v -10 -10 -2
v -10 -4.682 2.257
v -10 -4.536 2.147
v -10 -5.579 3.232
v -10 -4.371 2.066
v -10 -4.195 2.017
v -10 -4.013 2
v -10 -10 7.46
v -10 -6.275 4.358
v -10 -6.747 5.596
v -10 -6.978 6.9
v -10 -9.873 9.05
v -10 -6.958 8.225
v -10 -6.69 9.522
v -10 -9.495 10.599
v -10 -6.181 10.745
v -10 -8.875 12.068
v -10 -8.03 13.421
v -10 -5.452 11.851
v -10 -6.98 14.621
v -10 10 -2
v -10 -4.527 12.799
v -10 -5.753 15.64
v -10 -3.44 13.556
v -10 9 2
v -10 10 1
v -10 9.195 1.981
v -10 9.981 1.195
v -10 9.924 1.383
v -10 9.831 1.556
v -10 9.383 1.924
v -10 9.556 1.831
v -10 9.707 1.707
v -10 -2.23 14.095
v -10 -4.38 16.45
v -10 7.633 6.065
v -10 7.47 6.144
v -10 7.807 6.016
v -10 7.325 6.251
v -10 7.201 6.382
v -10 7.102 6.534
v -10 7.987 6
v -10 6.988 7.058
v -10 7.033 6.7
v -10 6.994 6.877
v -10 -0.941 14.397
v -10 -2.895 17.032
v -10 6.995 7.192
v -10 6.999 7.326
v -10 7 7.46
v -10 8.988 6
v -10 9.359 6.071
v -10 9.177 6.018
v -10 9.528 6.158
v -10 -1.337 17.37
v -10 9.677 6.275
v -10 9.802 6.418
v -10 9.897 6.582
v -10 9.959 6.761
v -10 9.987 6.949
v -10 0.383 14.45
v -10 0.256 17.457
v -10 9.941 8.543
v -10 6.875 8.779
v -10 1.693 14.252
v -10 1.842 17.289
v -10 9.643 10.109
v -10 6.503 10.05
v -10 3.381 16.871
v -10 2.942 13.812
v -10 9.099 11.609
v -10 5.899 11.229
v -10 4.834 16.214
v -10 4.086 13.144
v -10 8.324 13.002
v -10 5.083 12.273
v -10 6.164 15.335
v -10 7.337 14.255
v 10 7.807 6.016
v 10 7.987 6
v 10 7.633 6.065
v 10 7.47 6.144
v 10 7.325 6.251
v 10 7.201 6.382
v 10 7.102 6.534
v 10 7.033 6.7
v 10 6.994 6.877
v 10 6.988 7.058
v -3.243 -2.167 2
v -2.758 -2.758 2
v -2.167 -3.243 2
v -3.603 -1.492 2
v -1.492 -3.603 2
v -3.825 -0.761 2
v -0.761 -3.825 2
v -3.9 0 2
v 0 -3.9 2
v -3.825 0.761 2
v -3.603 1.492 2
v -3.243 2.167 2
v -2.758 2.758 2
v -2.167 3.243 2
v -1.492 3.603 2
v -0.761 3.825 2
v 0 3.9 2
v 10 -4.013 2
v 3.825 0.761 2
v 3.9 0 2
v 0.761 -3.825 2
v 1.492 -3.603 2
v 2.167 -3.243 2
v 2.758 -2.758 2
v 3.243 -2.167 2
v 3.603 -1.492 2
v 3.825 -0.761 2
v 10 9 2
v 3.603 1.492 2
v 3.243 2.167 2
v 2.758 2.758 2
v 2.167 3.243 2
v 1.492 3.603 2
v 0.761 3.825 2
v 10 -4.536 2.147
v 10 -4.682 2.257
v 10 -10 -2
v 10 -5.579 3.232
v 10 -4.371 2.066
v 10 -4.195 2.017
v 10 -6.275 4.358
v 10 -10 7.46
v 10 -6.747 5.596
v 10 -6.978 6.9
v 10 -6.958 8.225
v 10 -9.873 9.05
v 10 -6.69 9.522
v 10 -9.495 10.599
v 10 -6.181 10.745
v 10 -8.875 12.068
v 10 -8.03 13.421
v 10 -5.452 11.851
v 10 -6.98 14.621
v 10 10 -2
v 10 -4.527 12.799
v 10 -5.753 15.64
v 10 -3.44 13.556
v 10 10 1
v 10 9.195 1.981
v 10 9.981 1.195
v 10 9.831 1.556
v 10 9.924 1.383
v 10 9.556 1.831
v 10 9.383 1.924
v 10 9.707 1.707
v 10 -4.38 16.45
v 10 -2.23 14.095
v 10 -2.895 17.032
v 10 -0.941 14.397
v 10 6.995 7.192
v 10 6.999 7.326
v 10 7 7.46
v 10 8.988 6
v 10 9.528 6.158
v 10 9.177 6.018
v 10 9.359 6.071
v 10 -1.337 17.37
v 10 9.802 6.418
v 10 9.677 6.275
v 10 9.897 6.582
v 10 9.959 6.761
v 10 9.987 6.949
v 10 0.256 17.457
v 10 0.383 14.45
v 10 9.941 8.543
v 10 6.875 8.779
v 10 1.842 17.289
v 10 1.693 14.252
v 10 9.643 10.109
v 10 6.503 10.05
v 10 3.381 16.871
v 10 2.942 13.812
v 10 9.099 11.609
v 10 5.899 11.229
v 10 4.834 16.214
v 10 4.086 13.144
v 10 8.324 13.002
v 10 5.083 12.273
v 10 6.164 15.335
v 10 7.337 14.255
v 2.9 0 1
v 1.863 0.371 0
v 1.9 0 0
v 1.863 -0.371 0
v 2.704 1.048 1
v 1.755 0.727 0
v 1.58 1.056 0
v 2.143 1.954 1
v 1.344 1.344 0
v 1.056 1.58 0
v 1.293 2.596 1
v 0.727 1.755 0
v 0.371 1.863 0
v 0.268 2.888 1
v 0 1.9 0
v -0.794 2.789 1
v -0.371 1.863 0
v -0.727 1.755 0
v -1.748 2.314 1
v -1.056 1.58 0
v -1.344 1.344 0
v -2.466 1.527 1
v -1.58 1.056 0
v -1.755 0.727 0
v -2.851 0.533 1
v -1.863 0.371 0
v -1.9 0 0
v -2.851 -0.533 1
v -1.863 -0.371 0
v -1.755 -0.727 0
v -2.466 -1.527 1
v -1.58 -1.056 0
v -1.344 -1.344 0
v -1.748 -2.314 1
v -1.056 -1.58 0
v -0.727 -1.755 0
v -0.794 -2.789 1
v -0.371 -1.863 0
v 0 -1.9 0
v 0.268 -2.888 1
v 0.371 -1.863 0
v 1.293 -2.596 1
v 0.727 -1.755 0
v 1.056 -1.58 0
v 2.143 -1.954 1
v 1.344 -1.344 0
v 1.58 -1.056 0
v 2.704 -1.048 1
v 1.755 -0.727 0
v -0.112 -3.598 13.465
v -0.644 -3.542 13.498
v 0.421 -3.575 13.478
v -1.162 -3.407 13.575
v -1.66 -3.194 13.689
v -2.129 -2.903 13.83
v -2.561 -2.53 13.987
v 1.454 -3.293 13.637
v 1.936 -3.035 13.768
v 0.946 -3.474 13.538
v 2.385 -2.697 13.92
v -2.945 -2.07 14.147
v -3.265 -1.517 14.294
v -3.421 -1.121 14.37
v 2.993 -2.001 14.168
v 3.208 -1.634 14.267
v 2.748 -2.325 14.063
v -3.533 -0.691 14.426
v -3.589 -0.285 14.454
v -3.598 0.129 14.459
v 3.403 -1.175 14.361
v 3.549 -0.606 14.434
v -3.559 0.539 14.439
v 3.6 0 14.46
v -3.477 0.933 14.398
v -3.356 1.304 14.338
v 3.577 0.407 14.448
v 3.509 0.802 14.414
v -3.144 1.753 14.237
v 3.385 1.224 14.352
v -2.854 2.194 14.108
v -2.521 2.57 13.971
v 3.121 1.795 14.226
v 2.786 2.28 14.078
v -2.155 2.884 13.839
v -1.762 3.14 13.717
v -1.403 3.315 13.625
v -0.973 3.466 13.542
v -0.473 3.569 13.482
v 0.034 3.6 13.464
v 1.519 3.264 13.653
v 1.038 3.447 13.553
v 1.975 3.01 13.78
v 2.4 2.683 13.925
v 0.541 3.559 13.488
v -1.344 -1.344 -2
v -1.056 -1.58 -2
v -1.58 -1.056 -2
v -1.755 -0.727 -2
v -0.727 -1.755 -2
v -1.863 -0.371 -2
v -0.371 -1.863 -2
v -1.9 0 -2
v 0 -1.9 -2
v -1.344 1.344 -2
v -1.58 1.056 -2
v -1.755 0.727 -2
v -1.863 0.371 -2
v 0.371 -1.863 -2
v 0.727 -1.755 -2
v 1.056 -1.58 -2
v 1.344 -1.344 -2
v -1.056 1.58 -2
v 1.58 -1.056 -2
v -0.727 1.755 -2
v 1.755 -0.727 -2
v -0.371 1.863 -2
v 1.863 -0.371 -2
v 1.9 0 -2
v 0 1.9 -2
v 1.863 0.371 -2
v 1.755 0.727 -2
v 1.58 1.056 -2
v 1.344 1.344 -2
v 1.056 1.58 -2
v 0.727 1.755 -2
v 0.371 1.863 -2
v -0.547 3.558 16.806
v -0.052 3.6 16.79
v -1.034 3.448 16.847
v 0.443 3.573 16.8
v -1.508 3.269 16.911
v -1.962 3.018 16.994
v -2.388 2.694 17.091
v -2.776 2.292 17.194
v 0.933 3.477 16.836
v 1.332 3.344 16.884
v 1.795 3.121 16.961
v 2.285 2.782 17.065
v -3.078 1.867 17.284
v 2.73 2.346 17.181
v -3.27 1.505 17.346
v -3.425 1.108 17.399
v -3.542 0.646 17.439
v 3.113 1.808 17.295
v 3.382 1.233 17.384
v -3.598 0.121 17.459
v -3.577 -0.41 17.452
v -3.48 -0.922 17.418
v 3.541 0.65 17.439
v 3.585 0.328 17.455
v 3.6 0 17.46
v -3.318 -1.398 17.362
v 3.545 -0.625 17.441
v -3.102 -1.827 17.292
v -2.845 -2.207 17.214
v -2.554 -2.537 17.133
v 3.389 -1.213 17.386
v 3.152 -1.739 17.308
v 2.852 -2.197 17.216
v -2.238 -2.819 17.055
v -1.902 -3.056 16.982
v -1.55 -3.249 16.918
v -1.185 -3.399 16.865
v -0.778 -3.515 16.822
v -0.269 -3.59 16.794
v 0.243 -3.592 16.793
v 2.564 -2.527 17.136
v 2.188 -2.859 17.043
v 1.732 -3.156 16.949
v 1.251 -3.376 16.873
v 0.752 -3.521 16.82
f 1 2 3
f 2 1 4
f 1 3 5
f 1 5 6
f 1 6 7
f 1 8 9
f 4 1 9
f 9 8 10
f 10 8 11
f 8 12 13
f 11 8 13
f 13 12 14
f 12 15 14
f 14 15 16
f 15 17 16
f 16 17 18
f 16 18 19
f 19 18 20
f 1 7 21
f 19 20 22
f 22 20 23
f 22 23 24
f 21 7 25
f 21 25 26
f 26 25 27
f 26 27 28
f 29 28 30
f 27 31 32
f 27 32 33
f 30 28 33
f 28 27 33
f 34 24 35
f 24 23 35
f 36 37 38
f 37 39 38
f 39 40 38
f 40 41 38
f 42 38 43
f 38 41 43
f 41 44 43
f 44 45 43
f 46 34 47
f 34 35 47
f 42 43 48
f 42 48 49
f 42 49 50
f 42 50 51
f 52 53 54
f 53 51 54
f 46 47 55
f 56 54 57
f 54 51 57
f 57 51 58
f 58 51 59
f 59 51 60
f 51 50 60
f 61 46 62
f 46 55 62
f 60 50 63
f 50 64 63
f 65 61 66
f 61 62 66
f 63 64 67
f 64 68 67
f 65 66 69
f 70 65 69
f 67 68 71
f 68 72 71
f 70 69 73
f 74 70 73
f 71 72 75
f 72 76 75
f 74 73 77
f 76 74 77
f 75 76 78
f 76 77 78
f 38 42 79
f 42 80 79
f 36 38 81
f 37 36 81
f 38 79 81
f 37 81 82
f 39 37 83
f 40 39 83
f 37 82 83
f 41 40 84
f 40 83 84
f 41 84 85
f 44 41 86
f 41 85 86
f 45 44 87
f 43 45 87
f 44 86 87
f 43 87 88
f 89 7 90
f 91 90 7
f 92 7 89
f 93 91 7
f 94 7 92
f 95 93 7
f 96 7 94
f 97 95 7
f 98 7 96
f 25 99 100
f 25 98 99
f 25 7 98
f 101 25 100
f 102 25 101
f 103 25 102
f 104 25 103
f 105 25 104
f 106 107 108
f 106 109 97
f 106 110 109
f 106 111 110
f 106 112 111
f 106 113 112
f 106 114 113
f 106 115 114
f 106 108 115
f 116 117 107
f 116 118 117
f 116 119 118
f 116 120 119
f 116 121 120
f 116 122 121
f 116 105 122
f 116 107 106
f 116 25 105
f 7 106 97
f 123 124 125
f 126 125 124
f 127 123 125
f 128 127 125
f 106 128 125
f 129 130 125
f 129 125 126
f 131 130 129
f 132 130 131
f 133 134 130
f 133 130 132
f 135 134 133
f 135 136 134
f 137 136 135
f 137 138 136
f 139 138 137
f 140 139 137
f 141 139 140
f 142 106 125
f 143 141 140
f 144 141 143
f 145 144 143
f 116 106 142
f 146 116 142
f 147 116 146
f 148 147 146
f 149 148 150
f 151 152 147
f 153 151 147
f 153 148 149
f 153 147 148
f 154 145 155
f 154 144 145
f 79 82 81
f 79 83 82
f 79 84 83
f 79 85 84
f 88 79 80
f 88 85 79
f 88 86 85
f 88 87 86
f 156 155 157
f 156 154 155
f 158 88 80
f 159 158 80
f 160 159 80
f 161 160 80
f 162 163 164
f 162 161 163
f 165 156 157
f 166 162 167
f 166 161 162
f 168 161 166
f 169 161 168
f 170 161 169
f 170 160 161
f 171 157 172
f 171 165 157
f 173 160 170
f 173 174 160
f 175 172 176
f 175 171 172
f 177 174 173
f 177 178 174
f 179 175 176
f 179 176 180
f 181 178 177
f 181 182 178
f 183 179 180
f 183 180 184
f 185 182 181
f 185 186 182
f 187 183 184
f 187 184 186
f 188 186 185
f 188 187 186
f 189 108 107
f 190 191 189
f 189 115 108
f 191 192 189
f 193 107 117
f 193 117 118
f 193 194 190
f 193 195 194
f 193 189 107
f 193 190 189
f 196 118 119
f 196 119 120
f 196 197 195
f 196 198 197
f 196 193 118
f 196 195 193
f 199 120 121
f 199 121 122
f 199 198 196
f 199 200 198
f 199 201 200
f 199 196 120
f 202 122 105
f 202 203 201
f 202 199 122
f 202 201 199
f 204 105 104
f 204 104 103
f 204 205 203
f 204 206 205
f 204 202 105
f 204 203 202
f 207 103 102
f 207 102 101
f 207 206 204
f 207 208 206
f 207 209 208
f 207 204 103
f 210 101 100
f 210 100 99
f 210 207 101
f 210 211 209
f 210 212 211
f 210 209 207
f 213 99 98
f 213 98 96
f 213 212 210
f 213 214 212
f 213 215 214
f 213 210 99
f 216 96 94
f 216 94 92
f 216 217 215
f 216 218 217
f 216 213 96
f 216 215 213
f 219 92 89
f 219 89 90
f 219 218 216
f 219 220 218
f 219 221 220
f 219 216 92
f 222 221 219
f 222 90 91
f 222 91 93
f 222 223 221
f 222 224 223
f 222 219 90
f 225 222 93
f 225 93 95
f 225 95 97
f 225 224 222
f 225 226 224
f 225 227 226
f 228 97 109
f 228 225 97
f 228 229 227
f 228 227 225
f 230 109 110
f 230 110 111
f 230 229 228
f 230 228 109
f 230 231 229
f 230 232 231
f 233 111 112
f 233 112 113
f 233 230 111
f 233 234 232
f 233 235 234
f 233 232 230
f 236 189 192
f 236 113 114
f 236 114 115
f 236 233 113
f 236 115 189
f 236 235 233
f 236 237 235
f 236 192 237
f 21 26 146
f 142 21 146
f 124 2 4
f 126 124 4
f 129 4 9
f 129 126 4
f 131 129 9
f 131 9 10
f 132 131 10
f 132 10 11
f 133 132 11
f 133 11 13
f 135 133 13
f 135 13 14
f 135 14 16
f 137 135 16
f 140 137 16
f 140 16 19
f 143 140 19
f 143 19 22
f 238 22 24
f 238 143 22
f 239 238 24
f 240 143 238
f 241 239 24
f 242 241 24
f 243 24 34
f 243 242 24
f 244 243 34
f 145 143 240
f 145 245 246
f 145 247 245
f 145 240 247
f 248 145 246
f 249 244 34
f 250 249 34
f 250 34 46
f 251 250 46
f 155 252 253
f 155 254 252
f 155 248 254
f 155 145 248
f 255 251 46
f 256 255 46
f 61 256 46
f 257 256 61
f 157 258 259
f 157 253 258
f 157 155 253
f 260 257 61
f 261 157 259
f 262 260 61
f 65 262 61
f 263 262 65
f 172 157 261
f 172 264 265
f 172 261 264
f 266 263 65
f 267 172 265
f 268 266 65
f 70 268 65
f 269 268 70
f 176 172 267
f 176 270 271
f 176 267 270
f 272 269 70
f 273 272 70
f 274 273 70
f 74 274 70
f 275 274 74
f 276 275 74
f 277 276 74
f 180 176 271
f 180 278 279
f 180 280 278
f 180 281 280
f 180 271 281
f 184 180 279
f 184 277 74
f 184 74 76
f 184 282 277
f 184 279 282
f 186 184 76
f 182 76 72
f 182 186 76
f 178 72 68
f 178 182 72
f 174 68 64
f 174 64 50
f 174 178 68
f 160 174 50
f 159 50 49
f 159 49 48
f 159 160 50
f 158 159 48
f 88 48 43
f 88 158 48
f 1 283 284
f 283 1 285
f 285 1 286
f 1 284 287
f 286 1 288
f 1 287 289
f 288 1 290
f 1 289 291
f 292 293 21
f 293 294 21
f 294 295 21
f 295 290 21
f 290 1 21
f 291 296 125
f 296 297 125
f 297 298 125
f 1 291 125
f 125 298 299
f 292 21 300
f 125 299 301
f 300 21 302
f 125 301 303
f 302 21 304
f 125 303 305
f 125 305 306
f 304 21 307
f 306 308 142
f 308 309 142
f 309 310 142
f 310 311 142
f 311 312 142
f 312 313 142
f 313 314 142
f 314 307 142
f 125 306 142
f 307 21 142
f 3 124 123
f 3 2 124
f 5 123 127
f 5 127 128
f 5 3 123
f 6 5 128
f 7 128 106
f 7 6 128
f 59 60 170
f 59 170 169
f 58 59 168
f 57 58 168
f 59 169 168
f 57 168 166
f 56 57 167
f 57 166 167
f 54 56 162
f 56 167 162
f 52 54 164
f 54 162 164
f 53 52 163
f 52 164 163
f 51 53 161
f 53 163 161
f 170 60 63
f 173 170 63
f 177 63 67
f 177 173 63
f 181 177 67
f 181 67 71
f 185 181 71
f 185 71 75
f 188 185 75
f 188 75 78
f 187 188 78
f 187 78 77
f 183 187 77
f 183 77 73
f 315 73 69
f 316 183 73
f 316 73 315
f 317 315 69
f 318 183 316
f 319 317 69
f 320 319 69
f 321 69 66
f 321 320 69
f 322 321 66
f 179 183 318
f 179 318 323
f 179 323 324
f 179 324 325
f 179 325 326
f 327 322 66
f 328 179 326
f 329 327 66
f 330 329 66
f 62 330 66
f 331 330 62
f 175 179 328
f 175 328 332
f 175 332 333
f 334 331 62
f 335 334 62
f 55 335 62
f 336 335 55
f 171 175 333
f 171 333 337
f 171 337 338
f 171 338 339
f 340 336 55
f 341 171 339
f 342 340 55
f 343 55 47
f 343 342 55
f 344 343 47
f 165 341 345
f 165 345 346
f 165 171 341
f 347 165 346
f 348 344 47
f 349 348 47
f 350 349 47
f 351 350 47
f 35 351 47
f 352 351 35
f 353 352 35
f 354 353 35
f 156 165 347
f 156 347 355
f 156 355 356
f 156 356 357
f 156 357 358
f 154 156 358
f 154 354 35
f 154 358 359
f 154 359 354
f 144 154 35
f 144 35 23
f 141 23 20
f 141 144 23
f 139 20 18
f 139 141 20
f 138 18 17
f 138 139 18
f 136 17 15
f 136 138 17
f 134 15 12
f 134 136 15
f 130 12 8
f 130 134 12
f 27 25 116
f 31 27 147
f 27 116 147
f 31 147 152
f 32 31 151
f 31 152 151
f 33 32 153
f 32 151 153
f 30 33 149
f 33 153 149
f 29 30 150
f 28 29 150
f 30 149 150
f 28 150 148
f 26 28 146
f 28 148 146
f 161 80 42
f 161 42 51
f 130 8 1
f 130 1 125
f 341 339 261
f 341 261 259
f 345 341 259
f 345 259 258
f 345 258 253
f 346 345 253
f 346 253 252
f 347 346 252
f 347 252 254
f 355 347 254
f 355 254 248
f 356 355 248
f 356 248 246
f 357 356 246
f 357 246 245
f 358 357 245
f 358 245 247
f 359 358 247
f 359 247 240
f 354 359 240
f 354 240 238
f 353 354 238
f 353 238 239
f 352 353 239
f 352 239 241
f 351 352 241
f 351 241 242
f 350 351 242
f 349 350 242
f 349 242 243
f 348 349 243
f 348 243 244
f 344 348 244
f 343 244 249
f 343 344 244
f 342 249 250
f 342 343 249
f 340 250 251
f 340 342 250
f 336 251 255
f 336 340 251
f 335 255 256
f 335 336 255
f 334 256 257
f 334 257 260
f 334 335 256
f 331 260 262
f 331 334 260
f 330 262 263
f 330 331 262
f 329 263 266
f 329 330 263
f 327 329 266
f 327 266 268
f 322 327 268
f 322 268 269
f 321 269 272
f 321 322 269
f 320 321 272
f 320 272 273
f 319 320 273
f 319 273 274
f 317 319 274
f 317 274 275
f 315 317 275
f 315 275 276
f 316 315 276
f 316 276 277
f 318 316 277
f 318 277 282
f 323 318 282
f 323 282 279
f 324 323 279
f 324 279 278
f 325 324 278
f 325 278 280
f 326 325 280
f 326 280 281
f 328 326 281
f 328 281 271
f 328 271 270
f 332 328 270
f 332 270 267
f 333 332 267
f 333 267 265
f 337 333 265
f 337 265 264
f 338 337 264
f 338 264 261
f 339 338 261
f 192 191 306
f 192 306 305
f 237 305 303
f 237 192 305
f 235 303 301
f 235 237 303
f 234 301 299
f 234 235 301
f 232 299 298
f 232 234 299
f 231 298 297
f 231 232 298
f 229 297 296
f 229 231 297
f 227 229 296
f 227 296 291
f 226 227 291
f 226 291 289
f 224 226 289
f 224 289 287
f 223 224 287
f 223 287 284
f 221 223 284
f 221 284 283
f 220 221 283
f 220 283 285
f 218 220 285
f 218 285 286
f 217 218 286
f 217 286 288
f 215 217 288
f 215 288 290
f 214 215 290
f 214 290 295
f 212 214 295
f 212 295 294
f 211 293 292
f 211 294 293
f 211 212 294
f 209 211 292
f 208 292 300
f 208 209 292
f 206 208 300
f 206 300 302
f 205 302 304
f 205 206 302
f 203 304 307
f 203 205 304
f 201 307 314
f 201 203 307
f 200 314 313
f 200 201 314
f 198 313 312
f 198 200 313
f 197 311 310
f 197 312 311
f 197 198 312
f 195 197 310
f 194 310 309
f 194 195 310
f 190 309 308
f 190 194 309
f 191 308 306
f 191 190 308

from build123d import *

# Parameters (mm, degrees)
F0_W      = 20
F0_H      = 20
F1_DEPTH  = 2
F3_DEPTH  = 10
F4_W      = 10
F4_H      = 4
F5_DEPTH  = 10
F6_R      = 1
F8_R      = 1.9
F9_DEPTH  = 25
F8_R_2    = 3.6
F10_DEPTH = 15
F11_SIZE  = 2


with BuildPart() as f1:
    # F0 (on Top) → F1 (new body, symmetric)
    with BuildSketch(Plane.XY):
        Rectangle(F0_W, F0_H)
    extrude(amount=F1_DEPTH, both=True)

    # F2 (on Right) → F3 (join, symmetric)
    with BuildSketch(Plane.YZ):
        with BuildLine():
            Line((0, 0), (6.6592096346, 0))
            ThreePointArc((6.6592096346, 0), (4.0870468344, 16.5868898597), (-10, 7.4602229888))
            Line((-10, 7.4602229888), (-10, 0))
            Line((-10, 0), (-6.6592096346, 0))
            Line((-6.6592096346, 0), (0, 0))
        make_face()
        with BuildLine():
            ThreePointArc((-4.3801786394, 2), (-3.0280975483, 13.7713738535), (7, 7.4602229888))
            ThreePointArc((7, 7.4602229888), (6.3111508648, 4.4321254404), (4.3801786394, 2))
            ThreePointArc((4.3801786394, 2), (0, 0.4602229888), (-4.3801786394, 2))
        make_face(mode=Mode.SUBTRACT)
    extrude(amount=F3_DEPTH, both=True)

    # F4 (on Right) → F5 (cut, symmetric)
    with BuildSketch(Plane.YZ):
        with Locations((7.6843140367, 4)):
            Rectangle(F4_W, F4_H)
    extrude(amount=F5_DEPTH, both=True, mode=Mode.SUBTRACT)

    # F6
    f6_edges = [f1.edges().sort_by_distance(p)[0] for p in [
        (0, 10, 2),
        (0, 9.892813, 6),
        (0, 6.846002, 6),
        (0, -4.380179, 2),
    ]]
    fillet(f6_edges, radius=F6_R)

    # F8 (on offset) → F9 (cut)
    with BuildSketch(Plane(origin=(0, 0, 20.2), x_dir=(1, 0, 0), z_dir=(0, 0, -1))):
        Circle(F8_R)
    extrude(amount=F9_DEPTH, mode=Mode.SUBTRACT)

    # F8 (on offset) → F10 (cut)
    with BuildSketch(Plane(origin=(0, 0, 20.2), x_dir=(1, 0, 0), z_dir=(0, 0, -1))):
        Circle(F8_R_2)
        Circle(F8_R, mode=Mode.SUBTRACT)
    extrude(amount=F10_DEPTH, mode=Mode.SUBTRACT)

    # F11
    f11_edges = [f1.edges().sort_by_distance(p)[0] for p in [
        (-1.9, 0, 2),
    ]]
    chamfer(f11_edges, length=F11_SIZE)


solid = f1.part
